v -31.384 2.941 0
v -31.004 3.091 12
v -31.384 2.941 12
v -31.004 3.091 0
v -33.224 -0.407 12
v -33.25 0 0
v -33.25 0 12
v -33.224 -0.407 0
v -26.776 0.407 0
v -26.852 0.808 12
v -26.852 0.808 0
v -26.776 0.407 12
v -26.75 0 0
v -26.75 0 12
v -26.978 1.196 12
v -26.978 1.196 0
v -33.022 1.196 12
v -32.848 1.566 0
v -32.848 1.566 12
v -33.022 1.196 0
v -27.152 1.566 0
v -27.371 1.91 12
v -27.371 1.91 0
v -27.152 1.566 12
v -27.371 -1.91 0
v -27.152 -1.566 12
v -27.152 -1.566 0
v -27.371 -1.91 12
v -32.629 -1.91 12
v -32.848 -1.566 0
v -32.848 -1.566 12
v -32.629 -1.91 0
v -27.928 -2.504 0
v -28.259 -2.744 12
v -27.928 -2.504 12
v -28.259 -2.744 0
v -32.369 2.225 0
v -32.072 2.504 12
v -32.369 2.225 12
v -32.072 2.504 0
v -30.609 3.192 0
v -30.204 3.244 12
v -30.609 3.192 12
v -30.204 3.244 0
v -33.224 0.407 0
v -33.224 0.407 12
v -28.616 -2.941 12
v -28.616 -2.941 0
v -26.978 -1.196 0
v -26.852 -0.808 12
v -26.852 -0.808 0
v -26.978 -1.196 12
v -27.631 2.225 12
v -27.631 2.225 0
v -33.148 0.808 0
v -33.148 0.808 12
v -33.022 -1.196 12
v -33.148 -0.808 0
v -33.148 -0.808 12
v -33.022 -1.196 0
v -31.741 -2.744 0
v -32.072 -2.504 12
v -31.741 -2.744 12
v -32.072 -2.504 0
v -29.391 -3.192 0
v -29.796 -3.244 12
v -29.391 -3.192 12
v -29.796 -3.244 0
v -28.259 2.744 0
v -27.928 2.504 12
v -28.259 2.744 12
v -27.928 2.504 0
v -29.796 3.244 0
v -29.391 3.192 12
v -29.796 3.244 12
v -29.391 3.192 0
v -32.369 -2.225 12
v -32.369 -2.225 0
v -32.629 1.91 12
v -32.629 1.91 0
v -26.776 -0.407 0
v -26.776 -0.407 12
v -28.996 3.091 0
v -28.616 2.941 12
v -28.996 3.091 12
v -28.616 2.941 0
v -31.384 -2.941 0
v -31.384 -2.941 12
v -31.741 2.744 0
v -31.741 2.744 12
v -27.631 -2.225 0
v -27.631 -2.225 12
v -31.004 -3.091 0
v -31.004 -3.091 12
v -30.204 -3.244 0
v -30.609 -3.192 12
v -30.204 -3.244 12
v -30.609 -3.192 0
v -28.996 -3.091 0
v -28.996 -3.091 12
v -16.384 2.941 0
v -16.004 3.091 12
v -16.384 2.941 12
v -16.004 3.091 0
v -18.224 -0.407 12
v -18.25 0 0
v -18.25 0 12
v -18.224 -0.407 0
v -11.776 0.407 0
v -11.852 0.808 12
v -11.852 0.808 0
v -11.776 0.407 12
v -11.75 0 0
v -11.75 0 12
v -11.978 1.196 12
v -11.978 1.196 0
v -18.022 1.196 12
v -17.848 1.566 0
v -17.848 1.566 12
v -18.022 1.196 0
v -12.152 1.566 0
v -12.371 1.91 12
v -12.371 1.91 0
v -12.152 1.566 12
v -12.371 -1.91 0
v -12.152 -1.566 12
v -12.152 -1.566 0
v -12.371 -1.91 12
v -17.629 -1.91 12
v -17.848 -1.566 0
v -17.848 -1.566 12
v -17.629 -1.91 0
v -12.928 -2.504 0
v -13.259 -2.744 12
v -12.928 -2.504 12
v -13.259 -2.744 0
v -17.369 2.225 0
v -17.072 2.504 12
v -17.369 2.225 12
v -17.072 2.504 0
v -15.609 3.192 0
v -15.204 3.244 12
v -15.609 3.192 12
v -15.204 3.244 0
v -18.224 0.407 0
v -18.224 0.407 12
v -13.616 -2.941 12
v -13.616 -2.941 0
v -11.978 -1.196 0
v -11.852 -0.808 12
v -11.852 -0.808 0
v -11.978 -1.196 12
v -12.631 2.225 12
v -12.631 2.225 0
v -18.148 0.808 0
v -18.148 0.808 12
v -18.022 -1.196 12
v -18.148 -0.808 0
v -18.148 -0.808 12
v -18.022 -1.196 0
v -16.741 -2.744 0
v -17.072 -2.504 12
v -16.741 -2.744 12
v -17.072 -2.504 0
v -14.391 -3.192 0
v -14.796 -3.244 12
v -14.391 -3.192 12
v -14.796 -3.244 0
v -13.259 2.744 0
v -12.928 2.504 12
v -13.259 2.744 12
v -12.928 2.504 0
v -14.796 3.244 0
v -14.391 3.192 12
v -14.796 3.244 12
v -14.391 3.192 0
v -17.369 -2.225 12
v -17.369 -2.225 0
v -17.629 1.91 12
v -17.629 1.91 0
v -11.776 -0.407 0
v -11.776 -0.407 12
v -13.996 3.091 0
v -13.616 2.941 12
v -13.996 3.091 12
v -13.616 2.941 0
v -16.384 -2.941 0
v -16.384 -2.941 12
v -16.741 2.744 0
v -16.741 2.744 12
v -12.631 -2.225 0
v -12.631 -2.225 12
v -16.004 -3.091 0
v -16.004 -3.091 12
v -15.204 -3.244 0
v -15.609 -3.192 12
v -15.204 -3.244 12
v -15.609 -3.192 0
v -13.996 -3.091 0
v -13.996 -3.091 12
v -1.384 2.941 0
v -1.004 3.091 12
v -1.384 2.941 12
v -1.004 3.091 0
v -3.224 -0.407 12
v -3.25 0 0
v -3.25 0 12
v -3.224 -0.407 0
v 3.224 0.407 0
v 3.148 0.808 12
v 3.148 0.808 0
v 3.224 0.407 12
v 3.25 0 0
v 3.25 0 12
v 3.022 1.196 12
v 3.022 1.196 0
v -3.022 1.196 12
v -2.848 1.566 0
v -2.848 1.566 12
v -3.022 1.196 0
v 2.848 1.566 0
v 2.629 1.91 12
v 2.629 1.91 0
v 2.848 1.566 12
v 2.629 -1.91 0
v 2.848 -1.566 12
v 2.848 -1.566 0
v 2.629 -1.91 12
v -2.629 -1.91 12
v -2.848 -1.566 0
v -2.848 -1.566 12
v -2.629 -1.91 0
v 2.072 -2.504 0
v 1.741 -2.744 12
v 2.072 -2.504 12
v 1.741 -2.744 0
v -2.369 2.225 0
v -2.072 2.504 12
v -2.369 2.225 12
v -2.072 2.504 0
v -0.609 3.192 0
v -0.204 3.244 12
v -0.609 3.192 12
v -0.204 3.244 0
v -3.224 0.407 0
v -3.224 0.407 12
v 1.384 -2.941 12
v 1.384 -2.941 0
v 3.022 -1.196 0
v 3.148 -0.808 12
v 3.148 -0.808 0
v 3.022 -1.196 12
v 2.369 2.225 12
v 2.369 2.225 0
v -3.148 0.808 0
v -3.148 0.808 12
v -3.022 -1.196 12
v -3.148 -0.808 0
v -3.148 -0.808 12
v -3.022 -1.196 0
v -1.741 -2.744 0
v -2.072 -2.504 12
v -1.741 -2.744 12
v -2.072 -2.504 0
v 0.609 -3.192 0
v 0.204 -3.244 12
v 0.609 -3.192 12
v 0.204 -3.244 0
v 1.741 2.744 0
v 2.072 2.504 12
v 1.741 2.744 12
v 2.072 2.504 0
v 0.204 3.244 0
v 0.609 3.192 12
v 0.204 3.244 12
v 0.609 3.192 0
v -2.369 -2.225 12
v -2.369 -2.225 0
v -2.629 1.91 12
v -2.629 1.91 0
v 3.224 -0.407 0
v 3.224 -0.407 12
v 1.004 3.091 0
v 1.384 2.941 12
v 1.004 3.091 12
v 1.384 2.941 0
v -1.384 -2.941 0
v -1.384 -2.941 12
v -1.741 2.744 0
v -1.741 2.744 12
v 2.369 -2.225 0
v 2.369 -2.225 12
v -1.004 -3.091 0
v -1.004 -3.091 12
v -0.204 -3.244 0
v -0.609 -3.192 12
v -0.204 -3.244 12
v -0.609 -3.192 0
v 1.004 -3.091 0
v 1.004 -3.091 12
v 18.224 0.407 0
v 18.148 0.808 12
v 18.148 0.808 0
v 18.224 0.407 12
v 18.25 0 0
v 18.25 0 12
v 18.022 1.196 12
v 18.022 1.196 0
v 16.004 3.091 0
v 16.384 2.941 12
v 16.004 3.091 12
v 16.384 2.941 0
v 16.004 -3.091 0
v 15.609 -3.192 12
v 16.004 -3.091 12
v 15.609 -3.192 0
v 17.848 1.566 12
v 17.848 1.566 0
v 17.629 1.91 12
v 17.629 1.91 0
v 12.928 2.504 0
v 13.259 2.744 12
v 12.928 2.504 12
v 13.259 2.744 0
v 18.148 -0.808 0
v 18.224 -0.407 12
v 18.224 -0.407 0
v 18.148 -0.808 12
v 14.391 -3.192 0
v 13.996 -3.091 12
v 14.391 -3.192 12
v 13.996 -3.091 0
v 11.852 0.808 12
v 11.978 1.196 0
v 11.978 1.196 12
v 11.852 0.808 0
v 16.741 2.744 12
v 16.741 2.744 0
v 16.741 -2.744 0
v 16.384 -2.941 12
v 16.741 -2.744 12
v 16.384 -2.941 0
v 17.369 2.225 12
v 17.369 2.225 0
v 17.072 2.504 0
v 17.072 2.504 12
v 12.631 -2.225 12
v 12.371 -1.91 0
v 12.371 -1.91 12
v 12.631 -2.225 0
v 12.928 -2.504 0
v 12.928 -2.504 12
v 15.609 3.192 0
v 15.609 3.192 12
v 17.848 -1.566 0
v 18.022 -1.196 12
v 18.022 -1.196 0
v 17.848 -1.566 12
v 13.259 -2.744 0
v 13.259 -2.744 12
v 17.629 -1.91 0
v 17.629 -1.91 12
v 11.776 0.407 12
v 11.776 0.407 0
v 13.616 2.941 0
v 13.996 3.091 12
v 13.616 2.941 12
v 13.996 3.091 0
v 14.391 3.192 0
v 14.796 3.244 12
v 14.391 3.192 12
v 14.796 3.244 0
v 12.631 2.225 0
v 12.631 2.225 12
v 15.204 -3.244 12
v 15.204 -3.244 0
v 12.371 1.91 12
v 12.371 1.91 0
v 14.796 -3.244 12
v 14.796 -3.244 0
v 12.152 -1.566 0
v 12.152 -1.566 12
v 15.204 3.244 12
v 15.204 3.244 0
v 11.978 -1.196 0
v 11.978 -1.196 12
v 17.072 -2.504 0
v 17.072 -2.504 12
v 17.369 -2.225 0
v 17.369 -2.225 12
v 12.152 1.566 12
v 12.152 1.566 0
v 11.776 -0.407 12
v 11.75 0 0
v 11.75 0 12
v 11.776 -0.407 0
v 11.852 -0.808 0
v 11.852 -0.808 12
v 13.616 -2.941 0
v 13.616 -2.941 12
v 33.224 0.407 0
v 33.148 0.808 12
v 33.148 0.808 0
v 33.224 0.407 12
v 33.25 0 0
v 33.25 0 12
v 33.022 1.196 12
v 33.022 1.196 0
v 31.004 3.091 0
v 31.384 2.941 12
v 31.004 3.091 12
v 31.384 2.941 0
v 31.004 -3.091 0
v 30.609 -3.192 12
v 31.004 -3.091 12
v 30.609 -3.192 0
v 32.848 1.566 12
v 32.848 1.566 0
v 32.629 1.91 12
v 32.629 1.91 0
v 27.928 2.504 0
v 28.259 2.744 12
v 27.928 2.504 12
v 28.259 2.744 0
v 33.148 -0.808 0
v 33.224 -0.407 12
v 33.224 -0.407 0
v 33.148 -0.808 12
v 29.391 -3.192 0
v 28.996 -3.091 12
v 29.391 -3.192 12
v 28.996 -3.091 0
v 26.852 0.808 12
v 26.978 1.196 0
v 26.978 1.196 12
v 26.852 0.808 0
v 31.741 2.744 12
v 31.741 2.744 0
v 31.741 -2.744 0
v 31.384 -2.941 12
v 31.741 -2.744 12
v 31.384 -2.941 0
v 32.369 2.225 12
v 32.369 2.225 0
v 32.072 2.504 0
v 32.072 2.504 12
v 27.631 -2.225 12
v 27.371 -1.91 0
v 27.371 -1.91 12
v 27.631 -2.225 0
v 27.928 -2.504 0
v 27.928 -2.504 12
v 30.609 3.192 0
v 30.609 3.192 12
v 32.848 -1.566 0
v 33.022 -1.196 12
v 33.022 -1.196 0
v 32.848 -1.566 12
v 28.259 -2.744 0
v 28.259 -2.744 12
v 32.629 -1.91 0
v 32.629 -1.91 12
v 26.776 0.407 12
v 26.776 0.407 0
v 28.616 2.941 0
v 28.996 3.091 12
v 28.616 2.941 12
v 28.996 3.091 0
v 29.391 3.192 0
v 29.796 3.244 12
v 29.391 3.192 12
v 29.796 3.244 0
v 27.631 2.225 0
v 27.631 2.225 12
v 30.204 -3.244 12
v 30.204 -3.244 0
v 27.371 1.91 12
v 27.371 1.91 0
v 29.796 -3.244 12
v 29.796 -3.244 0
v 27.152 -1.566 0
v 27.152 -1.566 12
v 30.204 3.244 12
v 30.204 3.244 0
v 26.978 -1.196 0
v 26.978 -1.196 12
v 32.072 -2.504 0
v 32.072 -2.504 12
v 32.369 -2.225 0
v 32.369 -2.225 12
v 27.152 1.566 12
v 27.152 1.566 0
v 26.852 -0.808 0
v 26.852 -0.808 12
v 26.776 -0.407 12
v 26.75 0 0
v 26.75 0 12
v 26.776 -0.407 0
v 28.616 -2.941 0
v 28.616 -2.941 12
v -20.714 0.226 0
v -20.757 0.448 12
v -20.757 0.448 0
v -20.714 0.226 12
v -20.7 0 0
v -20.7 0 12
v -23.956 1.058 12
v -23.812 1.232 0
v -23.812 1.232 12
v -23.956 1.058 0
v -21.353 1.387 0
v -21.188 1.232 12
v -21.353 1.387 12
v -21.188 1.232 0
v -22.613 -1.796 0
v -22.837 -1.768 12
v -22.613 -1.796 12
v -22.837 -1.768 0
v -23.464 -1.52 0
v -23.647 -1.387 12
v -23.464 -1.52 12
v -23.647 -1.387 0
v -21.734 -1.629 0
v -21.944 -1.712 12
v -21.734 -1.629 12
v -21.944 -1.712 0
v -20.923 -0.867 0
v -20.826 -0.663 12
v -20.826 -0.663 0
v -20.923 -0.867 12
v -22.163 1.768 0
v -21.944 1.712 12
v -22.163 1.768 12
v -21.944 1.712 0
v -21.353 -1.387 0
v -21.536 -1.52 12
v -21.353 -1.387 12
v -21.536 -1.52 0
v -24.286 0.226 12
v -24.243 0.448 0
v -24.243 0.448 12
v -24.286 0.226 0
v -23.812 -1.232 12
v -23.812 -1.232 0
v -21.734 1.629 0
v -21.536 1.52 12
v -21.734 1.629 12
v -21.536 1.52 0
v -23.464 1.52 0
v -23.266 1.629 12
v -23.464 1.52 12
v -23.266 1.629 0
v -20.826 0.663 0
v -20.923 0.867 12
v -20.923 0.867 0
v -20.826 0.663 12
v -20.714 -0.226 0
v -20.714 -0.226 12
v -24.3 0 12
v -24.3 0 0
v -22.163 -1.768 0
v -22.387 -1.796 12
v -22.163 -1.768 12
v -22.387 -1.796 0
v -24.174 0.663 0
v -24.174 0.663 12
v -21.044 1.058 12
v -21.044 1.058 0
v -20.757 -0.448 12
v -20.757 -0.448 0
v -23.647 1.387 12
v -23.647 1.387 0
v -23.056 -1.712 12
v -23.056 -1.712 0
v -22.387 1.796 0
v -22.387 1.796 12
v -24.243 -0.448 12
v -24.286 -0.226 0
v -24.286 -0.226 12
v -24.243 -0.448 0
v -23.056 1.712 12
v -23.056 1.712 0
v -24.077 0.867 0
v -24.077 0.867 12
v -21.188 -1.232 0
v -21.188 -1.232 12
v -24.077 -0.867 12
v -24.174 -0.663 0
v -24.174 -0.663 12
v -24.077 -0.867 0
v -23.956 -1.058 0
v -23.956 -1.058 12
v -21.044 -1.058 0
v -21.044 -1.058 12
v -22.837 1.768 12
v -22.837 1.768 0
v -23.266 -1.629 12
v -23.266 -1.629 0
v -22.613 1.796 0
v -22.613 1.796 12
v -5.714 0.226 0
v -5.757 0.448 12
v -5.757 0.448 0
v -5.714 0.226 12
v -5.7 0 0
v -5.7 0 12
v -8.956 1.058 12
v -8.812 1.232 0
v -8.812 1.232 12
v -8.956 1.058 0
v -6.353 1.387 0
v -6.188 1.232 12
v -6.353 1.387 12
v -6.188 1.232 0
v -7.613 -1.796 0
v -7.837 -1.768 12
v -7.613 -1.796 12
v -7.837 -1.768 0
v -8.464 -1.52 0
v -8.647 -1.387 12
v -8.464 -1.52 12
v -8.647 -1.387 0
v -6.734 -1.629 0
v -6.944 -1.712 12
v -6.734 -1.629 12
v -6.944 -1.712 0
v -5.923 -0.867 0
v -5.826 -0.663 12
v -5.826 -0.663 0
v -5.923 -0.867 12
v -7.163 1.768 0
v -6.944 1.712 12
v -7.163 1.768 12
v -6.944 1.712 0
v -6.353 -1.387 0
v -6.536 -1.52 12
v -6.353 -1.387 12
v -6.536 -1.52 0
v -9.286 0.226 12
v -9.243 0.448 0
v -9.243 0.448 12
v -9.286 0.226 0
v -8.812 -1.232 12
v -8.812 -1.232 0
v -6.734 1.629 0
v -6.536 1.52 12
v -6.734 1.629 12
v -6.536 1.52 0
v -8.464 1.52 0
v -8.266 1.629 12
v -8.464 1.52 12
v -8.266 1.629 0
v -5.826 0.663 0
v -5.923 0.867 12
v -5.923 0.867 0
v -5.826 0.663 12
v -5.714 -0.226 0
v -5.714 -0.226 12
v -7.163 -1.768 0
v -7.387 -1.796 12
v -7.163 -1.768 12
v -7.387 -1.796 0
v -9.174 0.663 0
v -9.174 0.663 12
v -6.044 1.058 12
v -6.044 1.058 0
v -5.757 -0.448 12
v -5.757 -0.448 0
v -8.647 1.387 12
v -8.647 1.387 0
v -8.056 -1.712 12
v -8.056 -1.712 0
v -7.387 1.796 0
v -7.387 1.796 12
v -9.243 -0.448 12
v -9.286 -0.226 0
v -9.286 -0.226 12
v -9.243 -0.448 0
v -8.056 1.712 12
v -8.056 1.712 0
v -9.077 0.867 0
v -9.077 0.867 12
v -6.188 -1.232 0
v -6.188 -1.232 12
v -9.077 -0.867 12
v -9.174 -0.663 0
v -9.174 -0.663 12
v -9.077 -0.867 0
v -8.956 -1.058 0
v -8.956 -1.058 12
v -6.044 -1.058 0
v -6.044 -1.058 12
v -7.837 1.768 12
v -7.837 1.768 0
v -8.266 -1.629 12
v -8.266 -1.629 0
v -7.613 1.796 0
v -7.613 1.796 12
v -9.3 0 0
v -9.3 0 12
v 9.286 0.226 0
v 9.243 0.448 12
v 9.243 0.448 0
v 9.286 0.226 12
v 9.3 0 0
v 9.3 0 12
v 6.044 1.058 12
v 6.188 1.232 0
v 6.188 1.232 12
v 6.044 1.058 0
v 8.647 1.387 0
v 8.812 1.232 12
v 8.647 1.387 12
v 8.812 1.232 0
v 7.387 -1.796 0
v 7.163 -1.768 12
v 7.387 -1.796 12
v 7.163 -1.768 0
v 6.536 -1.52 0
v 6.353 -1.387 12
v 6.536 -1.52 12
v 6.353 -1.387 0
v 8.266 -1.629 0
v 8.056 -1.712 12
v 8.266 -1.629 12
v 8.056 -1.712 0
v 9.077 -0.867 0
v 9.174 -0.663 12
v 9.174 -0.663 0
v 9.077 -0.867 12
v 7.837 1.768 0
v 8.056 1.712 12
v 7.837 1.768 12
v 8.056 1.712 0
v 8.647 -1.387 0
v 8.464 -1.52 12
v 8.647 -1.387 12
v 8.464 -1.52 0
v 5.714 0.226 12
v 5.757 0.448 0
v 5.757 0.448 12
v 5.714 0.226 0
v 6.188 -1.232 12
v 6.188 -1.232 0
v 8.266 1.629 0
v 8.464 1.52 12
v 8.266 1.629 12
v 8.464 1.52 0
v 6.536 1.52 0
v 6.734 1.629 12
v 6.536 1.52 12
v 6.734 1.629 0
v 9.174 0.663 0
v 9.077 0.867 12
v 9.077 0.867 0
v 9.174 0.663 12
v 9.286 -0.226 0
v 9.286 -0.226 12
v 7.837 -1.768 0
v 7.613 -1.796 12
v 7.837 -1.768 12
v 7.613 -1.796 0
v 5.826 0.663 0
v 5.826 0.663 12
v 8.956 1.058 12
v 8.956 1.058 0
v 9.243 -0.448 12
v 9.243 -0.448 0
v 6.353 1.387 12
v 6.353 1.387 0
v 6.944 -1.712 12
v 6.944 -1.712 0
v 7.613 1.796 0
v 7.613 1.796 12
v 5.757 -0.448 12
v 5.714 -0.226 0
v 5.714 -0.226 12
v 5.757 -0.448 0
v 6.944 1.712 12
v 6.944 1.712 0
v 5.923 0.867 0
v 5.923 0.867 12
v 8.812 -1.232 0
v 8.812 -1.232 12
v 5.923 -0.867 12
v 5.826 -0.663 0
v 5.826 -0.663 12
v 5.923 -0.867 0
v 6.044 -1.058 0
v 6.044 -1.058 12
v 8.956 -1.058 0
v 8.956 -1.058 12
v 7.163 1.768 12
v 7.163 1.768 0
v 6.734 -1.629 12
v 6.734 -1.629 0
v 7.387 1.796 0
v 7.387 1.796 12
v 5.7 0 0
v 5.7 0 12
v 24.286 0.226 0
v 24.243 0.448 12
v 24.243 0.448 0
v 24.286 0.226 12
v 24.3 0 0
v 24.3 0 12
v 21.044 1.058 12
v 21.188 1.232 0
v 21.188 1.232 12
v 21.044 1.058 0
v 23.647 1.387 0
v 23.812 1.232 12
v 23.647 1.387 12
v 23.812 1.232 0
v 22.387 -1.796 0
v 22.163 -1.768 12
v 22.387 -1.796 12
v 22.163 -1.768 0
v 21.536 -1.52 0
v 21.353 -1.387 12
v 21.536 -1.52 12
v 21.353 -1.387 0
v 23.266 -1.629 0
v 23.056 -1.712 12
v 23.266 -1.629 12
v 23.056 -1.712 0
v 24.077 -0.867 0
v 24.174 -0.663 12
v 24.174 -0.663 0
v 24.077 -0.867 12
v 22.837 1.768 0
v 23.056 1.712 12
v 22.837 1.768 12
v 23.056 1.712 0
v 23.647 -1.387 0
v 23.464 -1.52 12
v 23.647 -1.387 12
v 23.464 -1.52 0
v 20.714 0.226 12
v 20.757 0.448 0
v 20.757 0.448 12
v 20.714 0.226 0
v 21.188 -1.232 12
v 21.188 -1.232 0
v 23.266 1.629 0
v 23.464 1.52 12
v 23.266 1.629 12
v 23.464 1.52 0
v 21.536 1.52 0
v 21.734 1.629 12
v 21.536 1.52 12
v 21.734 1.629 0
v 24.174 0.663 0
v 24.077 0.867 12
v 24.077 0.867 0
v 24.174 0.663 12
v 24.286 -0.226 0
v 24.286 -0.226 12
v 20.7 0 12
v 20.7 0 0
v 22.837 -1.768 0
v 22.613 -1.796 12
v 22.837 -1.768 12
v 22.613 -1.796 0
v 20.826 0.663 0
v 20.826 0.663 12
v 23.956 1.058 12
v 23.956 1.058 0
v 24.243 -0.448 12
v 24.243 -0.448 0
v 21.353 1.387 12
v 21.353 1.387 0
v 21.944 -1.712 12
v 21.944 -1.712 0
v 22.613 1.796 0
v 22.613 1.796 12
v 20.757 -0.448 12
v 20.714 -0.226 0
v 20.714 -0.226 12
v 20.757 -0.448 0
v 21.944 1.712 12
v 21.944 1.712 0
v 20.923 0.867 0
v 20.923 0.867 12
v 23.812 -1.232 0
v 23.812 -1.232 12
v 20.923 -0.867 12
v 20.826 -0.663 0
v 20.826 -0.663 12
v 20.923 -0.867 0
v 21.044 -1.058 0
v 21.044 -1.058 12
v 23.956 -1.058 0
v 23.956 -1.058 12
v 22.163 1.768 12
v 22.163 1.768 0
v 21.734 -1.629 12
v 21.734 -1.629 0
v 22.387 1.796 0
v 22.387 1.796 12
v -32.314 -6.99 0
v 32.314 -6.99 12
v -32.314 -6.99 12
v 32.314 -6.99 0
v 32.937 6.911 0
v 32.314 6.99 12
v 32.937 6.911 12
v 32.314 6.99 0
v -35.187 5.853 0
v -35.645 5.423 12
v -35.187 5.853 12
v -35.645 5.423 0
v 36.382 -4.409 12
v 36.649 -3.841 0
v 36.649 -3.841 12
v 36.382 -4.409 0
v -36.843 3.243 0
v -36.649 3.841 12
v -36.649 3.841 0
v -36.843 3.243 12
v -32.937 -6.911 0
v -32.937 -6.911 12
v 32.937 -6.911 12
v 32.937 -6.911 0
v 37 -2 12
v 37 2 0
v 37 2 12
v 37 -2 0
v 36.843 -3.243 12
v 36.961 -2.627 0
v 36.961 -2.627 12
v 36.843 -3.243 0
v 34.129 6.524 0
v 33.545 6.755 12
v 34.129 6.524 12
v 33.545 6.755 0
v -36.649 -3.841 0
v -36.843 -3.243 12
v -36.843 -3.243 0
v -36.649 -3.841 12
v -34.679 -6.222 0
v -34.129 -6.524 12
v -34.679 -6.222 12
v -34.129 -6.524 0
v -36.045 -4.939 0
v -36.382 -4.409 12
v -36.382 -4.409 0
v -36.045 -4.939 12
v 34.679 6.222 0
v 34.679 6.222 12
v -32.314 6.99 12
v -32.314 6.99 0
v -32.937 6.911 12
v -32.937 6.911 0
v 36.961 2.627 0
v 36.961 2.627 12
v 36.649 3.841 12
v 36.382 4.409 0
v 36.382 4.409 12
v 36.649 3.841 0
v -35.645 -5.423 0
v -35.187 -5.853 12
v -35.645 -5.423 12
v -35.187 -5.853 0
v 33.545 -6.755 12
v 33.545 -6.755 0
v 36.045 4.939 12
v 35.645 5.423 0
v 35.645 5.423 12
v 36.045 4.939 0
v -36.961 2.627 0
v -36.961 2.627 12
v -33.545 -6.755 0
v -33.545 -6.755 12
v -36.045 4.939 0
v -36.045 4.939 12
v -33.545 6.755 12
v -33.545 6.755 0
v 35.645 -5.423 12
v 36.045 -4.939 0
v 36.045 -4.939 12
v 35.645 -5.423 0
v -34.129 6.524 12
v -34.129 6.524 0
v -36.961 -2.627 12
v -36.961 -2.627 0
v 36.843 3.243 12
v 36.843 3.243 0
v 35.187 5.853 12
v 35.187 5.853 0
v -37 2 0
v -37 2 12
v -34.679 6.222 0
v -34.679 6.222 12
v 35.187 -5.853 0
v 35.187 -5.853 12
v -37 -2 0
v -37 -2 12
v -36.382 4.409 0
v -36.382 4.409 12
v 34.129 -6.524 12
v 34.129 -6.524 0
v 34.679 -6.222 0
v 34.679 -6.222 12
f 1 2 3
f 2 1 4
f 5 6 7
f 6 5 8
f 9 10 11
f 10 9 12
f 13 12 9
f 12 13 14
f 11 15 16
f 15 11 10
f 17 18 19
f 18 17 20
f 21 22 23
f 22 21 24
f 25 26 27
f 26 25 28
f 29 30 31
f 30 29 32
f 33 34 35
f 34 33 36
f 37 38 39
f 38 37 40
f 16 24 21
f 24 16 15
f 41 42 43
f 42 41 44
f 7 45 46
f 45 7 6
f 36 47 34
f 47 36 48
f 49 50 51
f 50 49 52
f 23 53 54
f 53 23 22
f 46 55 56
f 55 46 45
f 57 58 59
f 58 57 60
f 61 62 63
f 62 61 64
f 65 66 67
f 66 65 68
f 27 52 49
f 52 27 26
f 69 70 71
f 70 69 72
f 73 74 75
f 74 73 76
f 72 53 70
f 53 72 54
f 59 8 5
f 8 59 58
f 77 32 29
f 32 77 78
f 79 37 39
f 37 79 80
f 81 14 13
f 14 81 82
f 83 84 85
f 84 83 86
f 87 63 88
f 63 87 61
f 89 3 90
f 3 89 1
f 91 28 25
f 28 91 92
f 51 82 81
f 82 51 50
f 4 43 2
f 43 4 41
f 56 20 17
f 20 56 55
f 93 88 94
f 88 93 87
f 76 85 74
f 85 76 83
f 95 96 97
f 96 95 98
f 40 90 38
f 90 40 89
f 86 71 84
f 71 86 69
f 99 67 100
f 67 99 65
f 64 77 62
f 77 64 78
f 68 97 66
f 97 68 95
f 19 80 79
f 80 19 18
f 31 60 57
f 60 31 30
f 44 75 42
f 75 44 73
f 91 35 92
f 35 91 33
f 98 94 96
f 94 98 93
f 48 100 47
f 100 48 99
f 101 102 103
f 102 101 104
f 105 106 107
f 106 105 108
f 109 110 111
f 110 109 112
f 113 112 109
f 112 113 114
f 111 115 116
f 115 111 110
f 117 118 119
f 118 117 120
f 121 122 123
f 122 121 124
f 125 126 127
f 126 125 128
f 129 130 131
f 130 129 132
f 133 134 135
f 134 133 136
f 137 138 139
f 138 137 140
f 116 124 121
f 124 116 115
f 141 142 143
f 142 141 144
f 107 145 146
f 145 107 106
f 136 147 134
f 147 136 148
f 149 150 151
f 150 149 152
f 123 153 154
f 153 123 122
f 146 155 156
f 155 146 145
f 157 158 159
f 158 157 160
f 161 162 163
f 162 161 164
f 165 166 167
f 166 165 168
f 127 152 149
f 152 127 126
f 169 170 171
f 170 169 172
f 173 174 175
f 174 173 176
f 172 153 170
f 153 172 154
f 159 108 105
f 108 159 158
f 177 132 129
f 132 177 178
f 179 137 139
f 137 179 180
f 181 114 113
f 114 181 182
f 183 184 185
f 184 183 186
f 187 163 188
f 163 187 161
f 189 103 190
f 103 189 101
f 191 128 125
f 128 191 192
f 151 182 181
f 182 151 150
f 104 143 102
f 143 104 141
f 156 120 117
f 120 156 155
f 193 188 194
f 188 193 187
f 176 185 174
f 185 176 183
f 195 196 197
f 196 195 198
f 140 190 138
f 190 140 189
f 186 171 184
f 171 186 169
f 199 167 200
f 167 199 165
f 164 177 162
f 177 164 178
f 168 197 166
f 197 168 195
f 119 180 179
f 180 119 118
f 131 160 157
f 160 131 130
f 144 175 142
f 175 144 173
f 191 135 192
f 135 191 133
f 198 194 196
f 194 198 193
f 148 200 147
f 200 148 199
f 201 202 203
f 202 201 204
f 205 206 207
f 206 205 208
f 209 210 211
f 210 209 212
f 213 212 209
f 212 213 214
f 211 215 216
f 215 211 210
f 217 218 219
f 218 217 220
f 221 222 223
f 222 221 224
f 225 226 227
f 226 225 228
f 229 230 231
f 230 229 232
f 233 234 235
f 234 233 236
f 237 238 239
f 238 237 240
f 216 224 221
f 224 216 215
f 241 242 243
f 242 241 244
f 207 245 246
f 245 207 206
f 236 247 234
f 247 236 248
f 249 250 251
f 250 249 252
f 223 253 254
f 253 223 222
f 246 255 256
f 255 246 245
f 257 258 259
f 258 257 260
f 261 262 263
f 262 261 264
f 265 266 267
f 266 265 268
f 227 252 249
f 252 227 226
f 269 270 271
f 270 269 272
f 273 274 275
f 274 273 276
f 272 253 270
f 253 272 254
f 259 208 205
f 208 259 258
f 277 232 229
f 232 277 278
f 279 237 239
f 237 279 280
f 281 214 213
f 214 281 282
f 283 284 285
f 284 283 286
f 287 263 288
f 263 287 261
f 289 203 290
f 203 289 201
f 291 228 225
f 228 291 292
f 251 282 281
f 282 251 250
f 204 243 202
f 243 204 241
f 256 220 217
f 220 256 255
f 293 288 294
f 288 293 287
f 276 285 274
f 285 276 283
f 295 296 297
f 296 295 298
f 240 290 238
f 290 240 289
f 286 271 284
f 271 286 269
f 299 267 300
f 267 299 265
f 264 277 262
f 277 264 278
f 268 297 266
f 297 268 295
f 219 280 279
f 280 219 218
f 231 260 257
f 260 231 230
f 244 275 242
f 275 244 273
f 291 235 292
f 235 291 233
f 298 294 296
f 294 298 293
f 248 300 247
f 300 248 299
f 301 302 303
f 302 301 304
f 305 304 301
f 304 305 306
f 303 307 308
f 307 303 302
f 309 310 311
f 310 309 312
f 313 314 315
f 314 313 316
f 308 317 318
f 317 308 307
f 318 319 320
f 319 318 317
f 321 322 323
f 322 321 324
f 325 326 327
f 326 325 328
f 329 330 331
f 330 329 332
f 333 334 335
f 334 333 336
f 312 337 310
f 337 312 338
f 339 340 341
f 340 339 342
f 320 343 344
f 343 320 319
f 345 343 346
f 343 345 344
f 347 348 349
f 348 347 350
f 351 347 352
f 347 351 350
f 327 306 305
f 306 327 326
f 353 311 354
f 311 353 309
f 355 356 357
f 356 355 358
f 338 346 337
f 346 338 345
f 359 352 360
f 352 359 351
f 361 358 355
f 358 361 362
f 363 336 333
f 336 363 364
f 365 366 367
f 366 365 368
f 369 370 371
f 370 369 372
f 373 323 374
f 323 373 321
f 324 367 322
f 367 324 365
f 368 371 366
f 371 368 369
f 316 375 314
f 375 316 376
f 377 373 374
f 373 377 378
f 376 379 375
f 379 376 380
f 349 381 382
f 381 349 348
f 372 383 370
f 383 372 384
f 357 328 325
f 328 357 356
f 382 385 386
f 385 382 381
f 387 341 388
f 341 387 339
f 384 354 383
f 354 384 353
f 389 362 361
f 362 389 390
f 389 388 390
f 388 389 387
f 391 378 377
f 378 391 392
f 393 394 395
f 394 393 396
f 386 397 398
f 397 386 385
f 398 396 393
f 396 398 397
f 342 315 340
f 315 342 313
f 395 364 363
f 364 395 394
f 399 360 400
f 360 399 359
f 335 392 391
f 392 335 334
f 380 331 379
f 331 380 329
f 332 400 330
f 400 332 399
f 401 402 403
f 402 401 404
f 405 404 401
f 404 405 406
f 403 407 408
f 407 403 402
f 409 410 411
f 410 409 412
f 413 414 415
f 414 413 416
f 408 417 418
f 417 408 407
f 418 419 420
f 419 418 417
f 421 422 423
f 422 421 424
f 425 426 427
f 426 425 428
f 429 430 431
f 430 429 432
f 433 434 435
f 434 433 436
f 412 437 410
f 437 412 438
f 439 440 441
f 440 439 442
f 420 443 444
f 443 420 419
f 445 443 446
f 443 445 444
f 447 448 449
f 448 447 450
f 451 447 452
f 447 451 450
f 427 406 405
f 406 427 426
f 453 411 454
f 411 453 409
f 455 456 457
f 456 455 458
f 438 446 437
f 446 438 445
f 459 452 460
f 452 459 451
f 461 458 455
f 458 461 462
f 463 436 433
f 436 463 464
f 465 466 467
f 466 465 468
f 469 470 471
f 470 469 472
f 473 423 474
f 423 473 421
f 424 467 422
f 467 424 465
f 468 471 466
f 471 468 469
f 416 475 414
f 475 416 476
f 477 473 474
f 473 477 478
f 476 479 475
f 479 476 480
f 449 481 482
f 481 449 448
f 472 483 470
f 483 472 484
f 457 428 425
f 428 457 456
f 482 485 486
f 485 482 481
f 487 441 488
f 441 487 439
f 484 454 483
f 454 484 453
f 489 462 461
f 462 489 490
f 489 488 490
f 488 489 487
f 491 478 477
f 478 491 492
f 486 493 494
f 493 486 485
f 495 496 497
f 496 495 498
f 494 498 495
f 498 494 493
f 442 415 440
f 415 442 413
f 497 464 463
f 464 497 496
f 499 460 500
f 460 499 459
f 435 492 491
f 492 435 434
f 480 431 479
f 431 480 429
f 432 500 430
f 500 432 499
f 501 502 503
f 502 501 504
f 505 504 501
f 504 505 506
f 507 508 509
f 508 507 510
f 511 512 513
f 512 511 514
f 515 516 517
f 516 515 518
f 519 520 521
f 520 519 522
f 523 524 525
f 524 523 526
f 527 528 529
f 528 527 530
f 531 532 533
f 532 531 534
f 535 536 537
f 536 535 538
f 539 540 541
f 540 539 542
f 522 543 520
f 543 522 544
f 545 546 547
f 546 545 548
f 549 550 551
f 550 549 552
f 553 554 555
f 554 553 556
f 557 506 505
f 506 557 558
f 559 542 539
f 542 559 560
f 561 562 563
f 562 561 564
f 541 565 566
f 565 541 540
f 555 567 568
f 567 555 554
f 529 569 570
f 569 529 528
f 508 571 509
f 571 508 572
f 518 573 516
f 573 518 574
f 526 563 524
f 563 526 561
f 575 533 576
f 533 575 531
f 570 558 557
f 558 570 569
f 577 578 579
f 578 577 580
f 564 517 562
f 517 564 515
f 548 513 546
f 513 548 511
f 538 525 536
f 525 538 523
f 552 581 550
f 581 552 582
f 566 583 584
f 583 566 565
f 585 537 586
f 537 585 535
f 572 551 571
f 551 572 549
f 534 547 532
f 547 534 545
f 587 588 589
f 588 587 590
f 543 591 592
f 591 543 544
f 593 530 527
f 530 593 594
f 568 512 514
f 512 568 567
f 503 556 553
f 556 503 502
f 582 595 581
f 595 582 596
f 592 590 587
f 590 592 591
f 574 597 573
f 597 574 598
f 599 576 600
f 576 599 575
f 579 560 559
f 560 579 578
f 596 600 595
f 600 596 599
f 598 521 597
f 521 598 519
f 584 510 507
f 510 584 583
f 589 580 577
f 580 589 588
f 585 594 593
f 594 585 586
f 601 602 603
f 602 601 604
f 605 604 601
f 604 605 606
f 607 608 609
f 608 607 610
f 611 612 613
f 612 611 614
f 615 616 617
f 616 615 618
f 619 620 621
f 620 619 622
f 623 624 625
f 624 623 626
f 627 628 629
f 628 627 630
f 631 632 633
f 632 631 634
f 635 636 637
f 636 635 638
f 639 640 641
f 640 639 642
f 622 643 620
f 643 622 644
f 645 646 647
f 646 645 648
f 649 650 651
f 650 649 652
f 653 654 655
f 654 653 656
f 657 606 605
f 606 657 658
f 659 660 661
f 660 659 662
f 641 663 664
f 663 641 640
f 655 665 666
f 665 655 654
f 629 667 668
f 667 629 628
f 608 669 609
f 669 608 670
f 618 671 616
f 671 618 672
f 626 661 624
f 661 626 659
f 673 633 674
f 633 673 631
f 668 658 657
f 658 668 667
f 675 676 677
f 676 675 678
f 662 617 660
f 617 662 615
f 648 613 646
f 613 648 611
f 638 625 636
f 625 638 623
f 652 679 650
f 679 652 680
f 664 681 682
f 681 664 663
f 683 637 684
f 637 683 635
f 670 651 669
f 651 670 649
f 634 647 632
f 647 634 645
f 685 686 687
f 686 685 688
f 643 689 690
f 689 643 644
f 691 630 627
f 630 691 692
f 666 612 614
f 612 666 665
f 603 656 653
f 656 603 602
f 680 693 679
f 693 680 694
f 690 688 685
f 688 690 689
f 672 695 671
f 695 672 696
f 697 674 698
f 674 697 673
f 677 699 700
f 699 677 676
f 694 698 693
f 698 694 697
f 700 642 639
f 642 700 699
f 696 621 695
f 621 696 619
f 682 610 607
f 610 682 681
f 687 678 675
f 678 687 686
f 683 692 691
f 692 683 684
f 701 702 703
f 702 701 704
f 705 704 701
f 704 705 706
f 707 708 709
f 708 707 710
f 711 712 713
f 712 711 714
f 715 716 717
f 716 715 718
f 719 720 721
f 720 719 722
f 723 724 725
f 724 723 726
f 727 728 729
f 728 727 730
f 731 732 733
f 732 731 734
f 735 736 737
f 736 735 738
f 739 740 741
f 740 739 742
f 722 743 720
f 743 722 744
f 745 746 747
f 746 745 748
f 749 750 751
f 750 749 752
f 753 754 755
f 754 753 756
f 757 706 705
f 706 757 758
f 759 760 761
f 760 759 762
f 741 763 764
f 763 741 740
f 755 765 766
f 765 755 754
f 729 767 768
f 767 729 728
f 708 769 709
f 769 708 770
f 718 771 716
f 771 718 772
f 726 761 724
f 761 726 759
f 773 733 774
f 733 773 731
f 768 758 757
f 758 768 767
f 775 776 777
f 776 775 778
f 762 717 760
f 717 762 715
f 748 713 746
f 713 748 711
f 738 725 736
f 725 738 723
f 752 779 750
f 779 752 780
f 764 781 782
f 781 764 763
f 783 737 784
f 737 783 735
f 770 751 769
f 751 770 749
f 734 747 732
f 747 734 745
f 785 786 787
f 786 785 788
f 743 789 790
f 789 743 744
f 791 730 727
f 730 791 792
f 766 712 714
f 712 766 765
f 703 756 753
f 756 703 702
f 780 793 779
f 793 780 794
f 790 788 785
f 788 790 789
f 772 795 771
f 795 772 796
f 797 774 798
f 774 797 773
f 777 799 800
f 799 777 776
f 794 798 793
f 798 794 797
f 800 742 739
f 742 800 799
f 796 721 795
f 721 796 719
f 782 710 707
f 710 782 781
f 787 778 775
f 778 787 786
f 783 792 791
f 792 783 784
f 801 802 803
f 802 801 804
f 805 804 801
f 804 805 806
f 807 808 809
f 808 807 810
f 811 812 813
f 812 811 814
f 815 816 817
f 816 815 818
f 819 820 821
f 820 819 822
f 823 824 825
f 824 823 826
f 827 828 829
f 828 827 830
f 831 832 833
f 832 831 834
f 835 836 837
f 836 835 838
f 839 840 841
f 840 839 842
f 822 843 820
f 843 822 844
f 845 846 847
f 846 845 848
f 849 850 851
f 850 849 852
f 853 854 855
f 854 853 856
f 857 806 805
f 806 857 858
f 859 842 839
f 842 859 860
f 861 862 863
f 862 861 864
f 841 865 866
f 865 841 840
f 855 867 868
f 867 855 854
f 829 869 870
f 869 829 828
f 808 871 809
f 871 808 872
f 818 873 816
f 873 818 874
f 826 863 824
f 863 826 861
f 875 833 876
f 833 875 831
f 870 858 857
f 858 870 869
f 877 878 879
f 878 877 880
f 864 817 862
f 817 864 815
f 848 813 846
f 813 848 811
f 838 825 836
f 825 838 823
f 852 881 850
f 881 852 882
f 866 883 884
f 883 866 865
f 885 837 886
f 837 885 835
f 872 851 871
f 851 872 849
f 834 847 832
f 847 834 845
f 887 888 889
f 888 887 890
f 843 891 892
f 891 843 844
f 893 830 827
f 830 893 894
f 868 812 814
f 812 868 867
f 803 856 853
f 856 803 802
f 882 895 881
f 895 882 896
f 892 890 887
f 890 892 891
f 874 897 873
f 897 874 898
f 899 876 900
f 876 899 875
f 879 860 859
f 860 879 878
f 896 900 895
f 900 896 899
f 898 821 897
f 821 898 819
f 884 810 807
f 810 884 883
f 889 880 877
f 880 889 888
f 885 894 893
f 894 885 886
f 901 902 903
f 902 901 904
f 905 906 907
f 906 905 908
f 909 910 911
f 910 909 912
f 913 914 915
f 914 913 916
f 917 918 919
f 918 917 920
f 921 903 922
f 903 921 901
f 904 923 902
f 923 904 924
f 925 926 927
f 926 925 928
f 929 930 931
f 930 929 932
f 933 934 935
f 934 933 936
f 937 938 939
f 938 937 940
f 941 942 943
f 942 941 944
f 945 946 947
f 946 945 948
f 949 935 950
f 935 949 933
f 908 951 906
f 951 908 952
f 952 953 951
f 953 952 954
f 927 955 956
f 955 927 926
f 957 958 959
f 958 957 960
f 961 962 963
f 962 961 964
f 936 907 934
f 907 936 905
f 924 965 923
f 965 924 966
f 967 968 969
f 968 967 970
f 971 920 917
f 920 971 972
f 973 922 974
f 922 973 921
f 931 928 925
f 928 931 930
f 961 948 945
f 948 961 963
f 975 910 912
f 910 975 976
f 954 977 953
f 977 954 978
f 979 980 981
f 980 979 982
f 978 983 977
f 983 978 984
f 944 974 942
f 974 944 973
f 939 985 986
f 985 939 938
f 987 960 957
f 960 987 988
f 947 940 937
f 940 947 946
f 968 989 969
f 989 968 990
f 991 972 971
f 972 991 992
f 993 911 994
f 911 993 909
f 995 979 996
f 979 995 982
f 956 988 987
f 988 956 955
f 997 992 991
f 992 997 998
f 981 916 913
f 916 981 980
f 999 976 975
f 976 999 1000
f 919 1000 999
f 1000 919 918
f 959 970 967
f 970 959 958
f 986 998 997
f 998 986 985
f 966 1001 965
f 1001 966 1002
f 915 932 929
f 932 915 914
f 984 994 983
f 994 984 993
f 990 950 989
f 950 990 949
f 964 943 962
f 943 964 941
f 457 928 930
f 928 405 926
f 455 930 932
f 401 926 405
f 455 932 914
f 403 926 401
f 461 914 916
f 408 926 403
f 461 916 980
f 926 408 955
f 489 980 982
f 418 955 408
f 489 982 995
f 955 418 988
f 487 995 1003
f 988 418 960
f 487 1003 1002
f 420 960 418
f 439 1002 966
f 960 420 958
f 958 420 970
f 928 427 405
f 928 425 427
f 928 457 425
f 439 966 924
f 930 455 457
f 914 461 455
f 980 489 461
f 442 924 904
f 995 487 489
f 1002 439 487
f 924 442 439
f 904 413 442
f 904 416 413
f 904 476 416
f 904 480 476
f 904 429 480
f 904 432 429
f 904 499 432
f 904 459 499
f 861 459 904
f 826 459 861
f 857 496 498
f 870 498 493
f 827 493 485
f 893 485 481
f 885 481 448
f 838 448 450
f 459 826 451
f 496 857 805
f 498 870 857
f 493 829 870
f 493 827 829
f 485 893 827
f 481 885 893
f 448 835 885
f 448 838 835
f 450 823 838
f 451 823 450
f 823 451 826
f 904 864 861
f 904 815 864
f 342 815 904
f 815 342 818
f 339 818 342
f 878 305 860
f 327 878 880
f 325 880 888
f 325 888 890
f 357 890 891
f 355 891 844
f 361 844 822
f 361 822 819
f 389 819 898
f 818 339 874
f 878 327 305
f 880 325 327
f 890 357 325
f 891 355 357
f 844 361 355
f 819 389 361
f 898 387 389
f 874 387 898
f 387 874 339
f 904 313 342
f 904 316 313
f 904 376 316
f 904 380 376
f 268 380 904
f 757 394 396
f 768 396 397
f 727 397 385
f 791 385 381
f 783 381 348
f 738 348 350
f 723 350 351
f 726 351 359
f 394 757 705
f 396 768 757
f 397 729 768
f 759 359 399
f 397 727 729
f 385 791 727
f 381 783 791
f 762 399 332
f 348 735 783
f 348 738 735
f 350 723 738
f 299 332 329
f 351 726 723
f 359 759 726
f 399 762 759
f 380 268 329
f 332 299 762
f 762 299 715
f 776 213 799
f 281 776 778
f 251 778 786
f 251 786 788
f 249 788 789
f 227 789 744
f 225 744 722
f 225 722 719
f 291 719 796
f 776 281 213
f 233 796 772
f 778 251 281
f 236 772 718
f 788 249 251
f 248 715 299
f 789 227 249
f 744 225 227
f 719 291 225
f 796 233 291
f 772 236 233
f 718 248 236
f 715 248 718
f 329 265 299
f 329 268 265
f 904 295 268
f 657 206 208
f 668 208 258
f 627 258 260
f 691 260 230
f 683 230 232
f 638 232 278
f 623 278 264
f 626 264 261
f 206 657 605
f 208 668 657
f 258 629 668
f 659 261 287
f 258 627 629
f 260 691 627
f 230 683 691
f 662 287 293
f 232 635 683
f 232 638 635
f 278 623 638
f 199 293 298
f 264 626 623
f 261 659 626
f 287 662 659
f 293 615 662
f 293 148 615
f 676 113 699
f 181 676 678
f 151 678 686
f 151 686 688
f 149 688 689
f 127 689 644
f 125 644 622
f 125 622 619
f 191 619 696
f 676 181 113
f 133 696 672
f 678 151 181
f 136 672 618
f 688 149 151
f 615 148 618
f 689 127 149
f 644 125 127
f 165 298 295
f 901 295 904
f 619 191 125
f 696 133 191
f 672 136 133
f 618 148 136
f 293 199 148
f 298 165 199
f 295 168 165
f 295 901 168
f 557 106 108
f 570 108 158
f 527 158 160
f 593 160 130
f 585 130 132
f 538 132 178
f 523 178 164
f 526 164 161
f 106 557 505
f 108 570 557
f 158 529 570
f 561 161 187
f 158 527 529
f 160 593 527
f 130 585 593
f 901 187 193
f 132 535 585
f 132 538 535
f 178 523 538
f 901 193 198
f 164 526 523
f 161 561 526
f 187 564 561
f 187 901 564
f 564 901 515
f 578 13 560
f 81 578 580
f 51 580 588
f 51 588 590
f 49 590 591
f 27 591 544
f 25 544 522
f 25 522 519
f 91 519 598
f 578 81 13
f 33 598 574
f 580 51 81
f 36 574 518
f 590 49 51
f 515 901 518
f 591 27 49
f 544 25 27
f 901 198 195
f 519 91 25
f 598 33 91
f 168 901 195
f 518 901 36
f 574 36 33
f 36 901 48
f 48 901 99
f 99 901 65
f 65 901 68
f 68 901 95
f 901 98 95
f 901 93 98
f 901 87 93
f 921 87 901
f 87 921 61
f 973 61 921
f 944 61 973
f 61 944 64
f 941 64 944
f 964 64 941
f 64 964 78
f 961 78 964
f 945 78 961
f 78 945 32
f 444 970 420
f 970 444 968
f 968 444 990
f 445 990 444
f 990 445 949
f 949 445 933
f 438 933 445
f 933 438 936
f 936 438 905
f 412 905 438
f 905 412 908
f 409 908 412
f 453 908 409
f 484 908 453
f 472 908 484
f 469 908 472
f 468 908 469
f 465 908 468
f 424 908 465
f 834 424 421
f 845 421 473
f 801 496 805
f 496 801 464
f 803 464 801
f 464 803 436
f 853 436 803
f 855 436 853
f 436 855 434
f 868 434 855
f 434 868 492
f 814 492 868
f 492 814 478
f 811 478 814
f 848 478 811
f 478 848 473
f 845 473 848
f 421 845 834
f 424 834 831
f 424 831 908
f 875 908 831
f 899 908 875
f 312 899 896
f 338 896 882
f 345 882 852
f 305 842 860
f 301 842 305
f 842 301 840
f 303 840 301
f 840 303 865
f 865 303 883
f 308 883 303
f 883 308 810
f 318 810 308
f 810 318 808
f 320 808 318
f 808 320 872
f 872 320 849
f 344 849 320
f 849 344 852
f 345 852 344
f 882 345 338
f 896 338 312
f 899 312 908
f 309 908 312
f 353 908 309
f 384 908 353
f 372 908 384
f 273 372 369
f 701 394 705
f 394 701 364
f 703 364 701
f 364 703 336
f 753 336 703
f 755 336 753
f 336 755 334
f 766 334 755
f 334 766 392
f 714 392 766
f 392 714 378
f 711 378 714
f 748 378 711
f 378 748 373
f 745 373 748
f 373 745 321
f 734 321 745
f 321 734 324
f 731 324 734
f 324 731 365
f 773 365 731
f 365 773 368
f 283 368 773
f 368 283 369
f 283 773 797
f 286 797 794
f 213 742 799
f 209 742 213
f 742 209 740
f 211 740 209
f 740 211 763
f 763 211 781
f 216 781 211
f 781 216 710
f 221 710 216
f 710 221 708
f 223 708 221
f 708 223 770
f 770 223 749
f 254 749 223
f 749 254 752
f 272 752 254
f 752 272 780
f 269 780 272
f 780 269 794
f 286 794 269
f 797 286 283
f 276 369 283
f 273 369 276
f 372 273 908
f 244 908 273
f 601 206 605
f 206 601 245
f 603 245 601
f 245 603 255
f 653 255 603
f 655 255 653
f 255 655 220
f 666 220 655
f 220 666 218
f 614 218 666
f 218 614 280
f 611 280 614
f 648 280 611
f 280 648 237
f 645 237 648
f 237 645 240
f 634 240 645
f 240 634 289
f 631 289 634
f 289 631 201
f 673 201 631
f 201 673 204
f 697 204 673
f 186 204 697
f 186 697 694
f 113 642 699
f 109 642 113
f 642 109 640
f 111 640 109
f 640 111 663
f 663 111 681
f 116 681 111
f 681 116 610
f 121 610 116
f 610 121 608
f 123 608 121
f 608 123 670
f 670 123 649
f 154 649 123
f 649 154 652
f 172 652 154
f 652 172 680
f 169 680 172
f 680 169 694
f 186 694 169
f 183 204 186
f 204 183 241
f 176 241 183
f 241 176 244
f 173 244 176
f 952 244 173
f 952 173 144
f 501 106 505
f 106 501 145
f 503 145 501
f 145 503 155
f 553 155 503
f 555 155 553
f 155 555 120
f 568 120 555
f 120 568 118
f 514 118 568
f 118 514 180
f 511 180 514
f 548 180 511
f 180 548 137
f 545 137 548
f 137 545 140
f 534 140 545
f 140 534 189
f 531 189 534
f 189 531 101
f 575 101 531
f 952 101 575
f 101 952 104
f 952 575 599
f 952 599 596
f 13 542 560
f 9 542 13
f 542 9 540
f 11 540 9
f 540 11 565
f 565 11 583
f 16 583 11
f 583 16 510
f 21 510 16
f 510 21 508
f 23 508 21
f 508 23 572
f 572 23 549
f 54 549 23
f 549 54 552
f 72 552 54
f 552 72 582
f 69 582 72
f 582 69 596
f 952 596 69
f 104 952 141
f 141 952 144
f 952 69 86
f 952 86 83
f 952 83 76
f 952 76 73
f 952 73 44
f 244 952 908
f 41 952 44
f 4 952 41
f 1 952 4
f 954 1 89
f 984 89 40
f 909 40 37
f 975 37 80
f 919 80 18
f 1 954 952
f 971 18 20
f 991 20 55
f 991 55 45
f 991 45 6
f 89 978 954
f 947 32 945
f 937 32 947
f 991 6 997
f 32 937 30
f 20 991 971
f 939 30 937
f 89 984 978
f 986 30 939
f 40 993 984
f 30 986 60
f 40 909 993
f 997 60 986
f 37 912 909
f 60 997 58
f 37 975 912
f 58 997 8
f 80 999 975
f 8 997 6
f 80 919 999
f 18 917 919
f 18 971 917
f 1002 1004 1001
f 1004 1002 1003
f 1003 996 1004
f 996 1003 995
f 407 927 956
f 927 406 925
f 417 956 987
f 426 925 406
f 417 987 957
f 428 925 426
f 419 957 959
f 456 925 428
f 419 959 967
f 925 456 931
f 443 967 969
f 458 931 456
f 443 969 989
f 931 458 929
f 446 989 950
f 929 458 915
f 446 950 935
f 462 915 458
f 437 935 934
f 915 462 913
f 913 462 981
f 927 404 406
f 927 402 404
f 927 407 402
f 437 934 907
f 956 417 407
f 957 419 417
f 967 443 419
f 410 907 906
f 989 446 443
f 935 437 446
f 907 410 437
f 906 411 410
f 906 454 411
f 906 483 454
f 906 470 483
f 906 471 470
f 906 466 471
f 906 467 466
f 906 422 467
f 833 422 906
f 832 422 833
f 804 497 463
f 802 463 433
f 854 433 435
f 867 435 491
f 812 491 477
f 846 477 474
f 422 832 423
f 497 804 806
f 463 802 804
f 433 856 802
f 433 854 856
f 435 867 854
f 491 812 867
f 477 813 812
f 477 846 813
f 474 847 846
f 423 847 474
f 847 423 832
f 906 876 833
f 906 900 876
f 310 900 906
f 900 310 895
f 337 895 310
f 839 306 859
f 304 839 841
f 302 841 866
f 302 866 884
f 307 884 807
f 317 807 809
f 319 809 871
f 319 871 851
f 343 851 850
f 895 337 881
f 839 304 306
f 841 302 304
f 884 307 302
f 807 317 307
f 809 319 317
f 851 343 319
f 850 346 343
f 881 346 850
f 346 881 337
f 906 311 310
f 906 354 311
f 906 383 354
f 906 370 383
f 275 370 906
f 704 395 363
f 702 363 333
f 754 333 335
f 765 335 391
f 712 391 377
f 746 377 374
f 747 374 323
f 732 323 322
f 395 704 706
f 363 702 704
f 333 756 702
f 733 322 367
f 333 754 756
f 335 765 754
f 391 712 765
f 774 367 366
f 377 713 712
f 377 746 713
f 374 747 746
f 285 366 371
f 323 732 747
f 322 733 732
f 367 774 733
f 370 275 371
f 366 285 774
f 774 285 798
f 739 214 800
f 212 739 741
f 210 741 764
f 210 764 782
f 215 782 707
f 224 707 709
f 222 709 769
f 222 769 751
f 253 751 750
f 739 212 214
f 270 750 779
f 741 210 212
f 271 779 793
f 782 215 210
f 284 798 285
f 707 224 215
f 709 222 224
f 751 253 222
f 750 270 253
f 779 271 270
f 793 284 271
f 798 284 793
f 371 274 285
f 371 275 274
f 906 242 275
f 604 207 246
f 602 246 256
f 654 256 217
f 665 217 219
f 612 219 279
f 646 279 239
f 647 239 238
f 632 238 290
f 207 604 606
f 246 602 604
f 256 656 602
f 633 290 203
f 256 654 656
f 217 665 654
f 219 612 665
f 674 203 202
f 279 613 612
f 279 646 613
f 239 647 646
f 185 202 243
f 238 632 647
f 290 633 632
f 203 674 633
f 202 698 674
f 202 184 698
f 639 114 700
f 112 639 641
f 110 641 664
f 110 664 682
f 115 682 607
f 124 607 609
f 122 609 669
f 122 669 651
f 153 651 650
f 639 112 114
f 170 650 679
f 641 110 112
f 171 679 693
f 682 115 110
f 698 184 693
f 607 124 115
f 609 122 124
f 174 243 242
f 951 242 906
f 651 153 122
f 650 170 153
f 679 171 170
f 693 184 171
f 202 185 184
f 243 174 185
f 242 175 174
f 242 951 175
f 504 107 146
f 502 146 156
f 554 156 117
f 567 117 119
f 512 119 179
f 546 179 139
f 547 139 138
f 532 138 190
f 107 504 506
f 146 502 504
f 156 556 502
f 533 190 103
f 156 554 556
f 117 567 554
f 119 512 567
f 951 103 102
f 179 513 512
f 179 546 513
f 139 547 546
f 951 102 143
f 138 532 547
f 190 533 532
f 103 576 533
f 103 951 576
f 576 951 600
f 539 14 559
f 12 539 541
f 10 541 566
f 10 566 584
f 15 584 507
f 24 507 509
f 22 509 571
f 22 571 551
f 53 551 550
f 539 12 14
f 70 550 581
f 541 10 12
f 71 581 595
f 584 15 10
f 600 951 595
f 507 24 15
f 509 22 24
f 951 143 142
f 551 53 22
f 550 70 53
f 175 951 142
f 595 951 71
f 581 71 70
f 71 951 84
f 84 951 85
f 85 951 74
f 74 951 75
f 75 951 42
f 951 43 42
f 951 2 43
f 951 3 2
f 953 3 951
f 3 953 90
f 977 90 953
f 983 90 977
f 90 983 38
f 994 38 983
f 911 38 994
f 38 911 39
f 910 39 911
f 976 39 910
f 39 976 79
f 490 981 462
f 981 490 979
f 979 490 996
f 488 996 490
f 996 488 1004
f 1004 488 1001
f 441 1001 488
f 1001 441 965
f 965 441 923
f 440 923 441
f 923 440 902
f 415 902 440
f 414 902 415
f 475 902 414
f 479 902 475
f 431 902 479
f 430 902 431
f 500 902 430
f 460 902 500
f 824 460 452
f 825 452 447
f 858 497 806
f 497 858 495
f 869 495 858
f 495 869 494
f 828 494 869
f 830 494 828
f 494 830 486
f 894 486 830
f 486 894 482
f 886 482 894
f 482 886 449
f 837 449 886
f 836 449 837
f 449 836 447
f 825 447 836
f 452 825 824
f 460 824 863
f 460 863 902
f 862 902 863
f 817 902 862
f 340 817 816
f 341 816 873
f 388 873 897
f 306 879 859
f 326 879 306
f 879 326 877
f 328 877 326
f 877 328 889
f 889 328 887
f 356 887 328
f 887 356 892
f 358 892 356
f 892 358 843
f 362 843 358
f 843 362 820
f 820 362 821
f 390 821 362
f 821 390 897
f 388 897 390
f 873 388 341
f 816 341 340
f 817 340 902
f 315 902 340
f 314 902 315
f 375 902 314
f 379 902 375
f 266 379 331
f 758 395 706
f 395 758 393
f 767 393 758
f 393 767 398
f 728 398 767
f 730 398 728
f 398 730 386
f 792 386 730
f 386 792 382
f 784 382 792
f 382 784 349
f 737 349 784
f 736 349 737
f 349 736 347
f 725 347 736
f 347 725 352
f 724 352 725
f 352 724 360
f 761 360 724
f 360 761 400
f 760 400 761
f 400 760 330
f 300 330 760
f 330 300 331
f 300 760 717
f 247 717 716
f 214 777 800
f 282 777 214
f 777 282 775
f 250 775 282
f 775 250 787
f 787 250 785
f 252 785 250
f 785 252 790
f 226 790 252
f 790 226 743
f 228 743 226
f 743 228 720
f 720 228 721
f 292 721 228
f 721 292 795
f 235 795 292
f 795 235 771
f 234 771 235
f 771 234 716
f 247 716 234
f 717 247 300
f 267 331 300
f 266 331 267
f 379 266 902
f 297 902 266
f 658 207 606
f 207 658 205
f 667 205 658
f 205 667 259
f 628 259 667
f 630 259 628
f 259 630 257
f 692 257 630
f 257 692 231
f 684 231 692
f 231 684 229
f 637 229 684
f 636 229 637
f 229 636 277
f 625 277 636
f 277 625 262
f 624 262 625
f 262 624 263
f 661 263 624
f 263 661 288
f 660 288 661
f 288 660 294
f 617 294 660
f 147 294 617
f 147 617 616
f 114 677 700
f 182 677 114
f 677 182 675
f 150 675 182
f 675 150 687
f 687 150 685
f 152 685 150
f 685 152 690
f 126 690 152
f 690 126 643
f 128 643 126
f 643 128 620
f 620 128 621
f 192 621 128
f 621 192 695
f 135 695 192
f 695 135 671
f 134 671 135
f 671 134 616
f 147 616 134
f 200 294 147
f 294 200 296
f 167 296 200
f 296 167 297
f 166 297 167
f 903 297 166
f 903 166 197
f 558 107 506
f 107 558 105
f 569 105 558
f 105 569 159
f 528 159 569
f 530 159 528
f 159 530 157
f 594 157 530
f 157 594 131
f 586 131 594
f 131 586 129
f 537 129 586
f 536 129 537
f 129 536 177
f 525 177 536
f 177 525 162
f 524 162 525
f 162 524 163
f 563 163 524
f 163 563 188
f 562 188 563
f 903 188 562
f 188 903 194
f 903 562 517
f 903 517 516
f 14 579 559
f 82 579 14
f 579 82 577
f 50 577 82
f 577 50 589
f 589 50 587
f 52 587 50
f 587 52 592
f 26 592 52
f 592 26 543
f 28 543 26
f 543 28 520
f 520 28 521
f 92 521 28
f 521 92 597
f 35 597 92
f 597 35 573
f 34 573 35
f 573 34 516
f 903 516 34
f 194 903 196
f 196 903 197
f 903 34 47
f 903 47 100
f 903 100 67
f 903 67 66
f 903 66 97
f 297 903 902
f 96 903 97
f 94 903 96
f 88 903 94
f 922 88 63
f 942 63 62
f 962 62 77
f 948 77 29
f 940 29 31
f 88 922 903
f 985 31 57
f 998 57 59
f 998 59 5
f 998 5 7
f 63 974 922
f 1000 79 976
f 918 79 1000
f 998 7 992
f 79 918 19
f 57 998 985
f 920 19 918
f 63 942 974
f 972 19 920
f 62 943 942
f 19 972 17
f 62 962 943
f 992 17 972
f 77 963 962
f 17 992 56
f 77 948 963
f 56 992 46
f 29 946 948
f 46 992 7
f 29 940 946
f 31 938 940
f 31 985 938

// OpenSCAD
$fn = 50;


difference() {
	union() {
		*color(alpha = 1.0000000000, c = "gray") {
			translate(v = [0, 7, 0]) {
				linear_extrude(height = 1) {
					text(font = "Arial:style=Bold", halign = "center", size = 4.5000000000, text = "COMMENT plate main", valign = "center");
				}
			}
		}
		*color(alpha = 1.0000000000, c = "gray") {
			translate(v = [0, 14, 0]) {
				linear_extrude(height = 1) {
					text(font = "Arial:style=Bold", halign = "center", size = 4.5000000000, text = "COMMENT description oobb_plate_shape_p_type_12_depth_5_width_1_height_12_thickness_true_both_holes", valign = "center");
				}
			}
		}
		hull() {
			translate(v = [-32.0000000000, 2.0000000000, 0]) {
				cylinder(h = 12, r = 5);
			}
			translate(v = [32.0000000000, 2.0000000000, 0]) {
				cylinder(h = 12, r = 5);
			}
			translate(v = [-32.0000000000, -2.0000000000, 0]) {
				cylinder(h = 12, r = 5);
			}
			translate(v = [32.0000000000, -2.0000000000, 0]) {
				cylinder(h = 12, r = 5);
			}
		}
	}
	union() {
		*color(alpha = 1.0000000000, c = "gray") {
			translate(v = [0, 7, 0]) {
				linear_extrude(height = 1) {
					text(font = "Arial:style=Bold", halign = "center", size = 4.5000000000, text = "COMMENT holes main", valign = "center");
				}
			}
		}
		*color(alpha = 1.0000000000, c = "gray") {
			translate(v = [0, 14, 0]) {
				linear_extrude(height = 1) {
					text(font = "Arial:style=Bold", halign = "center", size = 4.5000000000, text = "COMMENT description oobb_holes_shape_n_type_5_width_1_height_12_thickness_true_both_holes", valign = "center");
				}
			}
		}
		translate(v = [-30.0000000000, 0.0000000000, 0]) {
			translate(v = [0, 0, -50]) {
				cylinder(h = 100, r = 3.2500000000);
			}
		}
		translate(v = [-15.0000000000, 0.0000000000, 0]) {
			translate(v = [0, 0, -50]) {
				cylinder(h = 100, r = 3.2500000000);
			}
		}
		translate(v = [0, 0, -50]) {
			cylinder(h = 100, r = 3.2500000000);
		}
		translate(v = [15.0000000000, 0.0000000000, 0]) {
			translate(v = [0, 0, -50]) {
				cylinder(h = 100, r = 3.2500000000);
			}
		}
		translate(v = [30.0000000000, 0.0000000000, 0]) {
			translate(v = [0, 0, -50]) {
				cylinder(h = 100, r = 3.2500000000);
			}
		}
		translate(v = [-30.0000000000, 0.0000000000, 0]) {
			translate(v = [0, 0, -50]) {
				cylinder(h = 100, r = 1.8000000000);
			}
		}
		translate(v = [-22.5000000000, 0.0000000000, 0]) {
			translate(v = [0, 0, -50]) {
				cylinder(h = 100, r = 1.8000000000);
			}
		}
		translate(v = [-15.0000000000, 0.0000000000, 0]) {
			translate(v = [0, 0, -50]) {
				cylinder(h = 100, r = 1.8000000000);
			}
		}
		translate(v = [-7.5000000000, 0.0000000000, 0]) {
			translate(v = [0, 0, -50]) {
				cylinder(h = 100, r = 1.8000000000);
			}
		}
		translate(v = [0, 0, -50]) {
			cylinder(h = 100, r = 1.8000000000);
		}
		translate(v = [7.5000000000, 0.0000000000, 0]) {
			translate(v = [0, 0, -50]) {
				cylinder(h = 100, r = 1.8000000000);
			}
		}
		translate(v = [15.0000000000, 0.0000000000, 0]) {
			translate(v = [0, 0, -50]) {
				cylinder(h = 100, r = 1.8000000000);
			}
		}
		translate(v = [22.5000000000, 0.0000000000, 0]) {
			translate(v = [0, 0, -50]) {
				cylinder(h = 100, r = 1.8000000000);
			}
		}
		translate(v = [30.0000000000, 0.0000000000, 0]) {
			translate(v = [0, 0, -50]) {
				cylinder(h = 100, r = 1.8000000000);
			}
		}
	}
}
